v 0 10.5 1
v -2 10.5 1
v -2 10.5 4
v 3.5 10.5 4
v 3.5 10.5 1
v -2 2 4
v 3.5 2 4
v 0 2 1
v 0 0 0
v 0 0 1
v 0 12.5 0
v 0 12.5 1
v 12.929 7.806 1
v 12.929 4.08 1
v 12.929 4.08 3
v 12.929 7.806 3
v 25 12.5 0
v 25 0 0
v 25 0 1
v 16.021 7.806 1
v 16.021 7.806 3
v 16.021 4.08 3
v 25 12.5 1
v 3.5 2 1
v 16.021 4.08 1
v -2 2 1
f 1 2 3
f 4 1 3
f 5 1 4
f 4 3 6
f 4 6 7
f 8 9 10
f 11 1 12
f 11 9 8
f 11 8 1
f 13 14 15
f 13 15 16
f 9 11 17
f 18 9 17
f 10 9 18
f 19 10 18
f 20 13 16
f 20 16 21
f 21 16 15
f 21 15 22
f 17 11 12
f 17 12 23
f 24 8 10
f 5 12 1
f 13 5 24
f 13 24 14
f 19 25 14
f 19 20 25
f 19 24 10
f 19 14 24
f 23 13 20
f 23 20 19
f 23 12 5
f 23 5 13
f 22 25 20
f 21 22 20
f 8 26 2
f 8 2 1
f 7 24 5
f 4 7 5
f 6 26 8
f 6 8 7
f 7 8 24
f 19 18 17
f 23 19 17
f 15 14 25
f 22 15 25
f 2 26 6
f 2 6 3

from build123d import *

# Parameters (mm, degrees)
SKIZZE1_W                       = 25
SKIZZE1_H                       = 12.5
SKIZZE1_W_2                     = 3.091607018
SKIZZE1_H_2                     = 3.725771618
AUFSATZ_LINEAR_AUSTRAGEN1_DEPTH = 1
SKIZZE1_2_W                     = 3.091607018
SKIZZE1_2_H                     = 3.725771618
AUFSATZ_LINEAR_AUSTRAGEN2_DEPTH = 3
SKIZZE2_W                       = 5.5
SKIZZE2_H                       = 8.5
AUFSATZ_LINEAR_AUSTRAGEN3_DEPTH = 3


with BuildPart() as part:
    # Skizze1 → Aufsatz-Linear austragen1 (new body)
    with BuildSketch(Plane.XY):
        with Locations((12.5, 6.25)):
            Rectangle(SKIZZE1_W, SKIZZE1_H)
        with Locations((14.475260973, 5.942942992)):
            Rectangle(SKIZZE1_W_2, SKIZZE1_H_2, mode=Mode.SUBTRACT)
    extrude(amount=AUFSATZ_LINEAR_AUSTRAGEN1_DEPTH)

    # Skizze1<2> → Aufsatz-Linear austragen2 (add)
    with BuildSketch(Plane.XY):
        with Locations((14.475260973, 5.942942992)):
            Rectangle(SKIZZE1_2_W, SKIZZE1_2_H)
    extrude(amount=AUFSATZ_LINEAR_AUSTRAGEN2_DEPTH)

    # Skizze2 → Aufsatz-Linear austragen3 (add)
    with BuildSketch(Plane.XY.offset(1)):
        with Locations((0.75, 6.25)):
            Rectangle(SKIZZE2_W, SKIZZE2_H)
    extrude(amount=AUFSATZ_LINEAR_AUSTRAGEN3_DEPTH)


solid = part.part
